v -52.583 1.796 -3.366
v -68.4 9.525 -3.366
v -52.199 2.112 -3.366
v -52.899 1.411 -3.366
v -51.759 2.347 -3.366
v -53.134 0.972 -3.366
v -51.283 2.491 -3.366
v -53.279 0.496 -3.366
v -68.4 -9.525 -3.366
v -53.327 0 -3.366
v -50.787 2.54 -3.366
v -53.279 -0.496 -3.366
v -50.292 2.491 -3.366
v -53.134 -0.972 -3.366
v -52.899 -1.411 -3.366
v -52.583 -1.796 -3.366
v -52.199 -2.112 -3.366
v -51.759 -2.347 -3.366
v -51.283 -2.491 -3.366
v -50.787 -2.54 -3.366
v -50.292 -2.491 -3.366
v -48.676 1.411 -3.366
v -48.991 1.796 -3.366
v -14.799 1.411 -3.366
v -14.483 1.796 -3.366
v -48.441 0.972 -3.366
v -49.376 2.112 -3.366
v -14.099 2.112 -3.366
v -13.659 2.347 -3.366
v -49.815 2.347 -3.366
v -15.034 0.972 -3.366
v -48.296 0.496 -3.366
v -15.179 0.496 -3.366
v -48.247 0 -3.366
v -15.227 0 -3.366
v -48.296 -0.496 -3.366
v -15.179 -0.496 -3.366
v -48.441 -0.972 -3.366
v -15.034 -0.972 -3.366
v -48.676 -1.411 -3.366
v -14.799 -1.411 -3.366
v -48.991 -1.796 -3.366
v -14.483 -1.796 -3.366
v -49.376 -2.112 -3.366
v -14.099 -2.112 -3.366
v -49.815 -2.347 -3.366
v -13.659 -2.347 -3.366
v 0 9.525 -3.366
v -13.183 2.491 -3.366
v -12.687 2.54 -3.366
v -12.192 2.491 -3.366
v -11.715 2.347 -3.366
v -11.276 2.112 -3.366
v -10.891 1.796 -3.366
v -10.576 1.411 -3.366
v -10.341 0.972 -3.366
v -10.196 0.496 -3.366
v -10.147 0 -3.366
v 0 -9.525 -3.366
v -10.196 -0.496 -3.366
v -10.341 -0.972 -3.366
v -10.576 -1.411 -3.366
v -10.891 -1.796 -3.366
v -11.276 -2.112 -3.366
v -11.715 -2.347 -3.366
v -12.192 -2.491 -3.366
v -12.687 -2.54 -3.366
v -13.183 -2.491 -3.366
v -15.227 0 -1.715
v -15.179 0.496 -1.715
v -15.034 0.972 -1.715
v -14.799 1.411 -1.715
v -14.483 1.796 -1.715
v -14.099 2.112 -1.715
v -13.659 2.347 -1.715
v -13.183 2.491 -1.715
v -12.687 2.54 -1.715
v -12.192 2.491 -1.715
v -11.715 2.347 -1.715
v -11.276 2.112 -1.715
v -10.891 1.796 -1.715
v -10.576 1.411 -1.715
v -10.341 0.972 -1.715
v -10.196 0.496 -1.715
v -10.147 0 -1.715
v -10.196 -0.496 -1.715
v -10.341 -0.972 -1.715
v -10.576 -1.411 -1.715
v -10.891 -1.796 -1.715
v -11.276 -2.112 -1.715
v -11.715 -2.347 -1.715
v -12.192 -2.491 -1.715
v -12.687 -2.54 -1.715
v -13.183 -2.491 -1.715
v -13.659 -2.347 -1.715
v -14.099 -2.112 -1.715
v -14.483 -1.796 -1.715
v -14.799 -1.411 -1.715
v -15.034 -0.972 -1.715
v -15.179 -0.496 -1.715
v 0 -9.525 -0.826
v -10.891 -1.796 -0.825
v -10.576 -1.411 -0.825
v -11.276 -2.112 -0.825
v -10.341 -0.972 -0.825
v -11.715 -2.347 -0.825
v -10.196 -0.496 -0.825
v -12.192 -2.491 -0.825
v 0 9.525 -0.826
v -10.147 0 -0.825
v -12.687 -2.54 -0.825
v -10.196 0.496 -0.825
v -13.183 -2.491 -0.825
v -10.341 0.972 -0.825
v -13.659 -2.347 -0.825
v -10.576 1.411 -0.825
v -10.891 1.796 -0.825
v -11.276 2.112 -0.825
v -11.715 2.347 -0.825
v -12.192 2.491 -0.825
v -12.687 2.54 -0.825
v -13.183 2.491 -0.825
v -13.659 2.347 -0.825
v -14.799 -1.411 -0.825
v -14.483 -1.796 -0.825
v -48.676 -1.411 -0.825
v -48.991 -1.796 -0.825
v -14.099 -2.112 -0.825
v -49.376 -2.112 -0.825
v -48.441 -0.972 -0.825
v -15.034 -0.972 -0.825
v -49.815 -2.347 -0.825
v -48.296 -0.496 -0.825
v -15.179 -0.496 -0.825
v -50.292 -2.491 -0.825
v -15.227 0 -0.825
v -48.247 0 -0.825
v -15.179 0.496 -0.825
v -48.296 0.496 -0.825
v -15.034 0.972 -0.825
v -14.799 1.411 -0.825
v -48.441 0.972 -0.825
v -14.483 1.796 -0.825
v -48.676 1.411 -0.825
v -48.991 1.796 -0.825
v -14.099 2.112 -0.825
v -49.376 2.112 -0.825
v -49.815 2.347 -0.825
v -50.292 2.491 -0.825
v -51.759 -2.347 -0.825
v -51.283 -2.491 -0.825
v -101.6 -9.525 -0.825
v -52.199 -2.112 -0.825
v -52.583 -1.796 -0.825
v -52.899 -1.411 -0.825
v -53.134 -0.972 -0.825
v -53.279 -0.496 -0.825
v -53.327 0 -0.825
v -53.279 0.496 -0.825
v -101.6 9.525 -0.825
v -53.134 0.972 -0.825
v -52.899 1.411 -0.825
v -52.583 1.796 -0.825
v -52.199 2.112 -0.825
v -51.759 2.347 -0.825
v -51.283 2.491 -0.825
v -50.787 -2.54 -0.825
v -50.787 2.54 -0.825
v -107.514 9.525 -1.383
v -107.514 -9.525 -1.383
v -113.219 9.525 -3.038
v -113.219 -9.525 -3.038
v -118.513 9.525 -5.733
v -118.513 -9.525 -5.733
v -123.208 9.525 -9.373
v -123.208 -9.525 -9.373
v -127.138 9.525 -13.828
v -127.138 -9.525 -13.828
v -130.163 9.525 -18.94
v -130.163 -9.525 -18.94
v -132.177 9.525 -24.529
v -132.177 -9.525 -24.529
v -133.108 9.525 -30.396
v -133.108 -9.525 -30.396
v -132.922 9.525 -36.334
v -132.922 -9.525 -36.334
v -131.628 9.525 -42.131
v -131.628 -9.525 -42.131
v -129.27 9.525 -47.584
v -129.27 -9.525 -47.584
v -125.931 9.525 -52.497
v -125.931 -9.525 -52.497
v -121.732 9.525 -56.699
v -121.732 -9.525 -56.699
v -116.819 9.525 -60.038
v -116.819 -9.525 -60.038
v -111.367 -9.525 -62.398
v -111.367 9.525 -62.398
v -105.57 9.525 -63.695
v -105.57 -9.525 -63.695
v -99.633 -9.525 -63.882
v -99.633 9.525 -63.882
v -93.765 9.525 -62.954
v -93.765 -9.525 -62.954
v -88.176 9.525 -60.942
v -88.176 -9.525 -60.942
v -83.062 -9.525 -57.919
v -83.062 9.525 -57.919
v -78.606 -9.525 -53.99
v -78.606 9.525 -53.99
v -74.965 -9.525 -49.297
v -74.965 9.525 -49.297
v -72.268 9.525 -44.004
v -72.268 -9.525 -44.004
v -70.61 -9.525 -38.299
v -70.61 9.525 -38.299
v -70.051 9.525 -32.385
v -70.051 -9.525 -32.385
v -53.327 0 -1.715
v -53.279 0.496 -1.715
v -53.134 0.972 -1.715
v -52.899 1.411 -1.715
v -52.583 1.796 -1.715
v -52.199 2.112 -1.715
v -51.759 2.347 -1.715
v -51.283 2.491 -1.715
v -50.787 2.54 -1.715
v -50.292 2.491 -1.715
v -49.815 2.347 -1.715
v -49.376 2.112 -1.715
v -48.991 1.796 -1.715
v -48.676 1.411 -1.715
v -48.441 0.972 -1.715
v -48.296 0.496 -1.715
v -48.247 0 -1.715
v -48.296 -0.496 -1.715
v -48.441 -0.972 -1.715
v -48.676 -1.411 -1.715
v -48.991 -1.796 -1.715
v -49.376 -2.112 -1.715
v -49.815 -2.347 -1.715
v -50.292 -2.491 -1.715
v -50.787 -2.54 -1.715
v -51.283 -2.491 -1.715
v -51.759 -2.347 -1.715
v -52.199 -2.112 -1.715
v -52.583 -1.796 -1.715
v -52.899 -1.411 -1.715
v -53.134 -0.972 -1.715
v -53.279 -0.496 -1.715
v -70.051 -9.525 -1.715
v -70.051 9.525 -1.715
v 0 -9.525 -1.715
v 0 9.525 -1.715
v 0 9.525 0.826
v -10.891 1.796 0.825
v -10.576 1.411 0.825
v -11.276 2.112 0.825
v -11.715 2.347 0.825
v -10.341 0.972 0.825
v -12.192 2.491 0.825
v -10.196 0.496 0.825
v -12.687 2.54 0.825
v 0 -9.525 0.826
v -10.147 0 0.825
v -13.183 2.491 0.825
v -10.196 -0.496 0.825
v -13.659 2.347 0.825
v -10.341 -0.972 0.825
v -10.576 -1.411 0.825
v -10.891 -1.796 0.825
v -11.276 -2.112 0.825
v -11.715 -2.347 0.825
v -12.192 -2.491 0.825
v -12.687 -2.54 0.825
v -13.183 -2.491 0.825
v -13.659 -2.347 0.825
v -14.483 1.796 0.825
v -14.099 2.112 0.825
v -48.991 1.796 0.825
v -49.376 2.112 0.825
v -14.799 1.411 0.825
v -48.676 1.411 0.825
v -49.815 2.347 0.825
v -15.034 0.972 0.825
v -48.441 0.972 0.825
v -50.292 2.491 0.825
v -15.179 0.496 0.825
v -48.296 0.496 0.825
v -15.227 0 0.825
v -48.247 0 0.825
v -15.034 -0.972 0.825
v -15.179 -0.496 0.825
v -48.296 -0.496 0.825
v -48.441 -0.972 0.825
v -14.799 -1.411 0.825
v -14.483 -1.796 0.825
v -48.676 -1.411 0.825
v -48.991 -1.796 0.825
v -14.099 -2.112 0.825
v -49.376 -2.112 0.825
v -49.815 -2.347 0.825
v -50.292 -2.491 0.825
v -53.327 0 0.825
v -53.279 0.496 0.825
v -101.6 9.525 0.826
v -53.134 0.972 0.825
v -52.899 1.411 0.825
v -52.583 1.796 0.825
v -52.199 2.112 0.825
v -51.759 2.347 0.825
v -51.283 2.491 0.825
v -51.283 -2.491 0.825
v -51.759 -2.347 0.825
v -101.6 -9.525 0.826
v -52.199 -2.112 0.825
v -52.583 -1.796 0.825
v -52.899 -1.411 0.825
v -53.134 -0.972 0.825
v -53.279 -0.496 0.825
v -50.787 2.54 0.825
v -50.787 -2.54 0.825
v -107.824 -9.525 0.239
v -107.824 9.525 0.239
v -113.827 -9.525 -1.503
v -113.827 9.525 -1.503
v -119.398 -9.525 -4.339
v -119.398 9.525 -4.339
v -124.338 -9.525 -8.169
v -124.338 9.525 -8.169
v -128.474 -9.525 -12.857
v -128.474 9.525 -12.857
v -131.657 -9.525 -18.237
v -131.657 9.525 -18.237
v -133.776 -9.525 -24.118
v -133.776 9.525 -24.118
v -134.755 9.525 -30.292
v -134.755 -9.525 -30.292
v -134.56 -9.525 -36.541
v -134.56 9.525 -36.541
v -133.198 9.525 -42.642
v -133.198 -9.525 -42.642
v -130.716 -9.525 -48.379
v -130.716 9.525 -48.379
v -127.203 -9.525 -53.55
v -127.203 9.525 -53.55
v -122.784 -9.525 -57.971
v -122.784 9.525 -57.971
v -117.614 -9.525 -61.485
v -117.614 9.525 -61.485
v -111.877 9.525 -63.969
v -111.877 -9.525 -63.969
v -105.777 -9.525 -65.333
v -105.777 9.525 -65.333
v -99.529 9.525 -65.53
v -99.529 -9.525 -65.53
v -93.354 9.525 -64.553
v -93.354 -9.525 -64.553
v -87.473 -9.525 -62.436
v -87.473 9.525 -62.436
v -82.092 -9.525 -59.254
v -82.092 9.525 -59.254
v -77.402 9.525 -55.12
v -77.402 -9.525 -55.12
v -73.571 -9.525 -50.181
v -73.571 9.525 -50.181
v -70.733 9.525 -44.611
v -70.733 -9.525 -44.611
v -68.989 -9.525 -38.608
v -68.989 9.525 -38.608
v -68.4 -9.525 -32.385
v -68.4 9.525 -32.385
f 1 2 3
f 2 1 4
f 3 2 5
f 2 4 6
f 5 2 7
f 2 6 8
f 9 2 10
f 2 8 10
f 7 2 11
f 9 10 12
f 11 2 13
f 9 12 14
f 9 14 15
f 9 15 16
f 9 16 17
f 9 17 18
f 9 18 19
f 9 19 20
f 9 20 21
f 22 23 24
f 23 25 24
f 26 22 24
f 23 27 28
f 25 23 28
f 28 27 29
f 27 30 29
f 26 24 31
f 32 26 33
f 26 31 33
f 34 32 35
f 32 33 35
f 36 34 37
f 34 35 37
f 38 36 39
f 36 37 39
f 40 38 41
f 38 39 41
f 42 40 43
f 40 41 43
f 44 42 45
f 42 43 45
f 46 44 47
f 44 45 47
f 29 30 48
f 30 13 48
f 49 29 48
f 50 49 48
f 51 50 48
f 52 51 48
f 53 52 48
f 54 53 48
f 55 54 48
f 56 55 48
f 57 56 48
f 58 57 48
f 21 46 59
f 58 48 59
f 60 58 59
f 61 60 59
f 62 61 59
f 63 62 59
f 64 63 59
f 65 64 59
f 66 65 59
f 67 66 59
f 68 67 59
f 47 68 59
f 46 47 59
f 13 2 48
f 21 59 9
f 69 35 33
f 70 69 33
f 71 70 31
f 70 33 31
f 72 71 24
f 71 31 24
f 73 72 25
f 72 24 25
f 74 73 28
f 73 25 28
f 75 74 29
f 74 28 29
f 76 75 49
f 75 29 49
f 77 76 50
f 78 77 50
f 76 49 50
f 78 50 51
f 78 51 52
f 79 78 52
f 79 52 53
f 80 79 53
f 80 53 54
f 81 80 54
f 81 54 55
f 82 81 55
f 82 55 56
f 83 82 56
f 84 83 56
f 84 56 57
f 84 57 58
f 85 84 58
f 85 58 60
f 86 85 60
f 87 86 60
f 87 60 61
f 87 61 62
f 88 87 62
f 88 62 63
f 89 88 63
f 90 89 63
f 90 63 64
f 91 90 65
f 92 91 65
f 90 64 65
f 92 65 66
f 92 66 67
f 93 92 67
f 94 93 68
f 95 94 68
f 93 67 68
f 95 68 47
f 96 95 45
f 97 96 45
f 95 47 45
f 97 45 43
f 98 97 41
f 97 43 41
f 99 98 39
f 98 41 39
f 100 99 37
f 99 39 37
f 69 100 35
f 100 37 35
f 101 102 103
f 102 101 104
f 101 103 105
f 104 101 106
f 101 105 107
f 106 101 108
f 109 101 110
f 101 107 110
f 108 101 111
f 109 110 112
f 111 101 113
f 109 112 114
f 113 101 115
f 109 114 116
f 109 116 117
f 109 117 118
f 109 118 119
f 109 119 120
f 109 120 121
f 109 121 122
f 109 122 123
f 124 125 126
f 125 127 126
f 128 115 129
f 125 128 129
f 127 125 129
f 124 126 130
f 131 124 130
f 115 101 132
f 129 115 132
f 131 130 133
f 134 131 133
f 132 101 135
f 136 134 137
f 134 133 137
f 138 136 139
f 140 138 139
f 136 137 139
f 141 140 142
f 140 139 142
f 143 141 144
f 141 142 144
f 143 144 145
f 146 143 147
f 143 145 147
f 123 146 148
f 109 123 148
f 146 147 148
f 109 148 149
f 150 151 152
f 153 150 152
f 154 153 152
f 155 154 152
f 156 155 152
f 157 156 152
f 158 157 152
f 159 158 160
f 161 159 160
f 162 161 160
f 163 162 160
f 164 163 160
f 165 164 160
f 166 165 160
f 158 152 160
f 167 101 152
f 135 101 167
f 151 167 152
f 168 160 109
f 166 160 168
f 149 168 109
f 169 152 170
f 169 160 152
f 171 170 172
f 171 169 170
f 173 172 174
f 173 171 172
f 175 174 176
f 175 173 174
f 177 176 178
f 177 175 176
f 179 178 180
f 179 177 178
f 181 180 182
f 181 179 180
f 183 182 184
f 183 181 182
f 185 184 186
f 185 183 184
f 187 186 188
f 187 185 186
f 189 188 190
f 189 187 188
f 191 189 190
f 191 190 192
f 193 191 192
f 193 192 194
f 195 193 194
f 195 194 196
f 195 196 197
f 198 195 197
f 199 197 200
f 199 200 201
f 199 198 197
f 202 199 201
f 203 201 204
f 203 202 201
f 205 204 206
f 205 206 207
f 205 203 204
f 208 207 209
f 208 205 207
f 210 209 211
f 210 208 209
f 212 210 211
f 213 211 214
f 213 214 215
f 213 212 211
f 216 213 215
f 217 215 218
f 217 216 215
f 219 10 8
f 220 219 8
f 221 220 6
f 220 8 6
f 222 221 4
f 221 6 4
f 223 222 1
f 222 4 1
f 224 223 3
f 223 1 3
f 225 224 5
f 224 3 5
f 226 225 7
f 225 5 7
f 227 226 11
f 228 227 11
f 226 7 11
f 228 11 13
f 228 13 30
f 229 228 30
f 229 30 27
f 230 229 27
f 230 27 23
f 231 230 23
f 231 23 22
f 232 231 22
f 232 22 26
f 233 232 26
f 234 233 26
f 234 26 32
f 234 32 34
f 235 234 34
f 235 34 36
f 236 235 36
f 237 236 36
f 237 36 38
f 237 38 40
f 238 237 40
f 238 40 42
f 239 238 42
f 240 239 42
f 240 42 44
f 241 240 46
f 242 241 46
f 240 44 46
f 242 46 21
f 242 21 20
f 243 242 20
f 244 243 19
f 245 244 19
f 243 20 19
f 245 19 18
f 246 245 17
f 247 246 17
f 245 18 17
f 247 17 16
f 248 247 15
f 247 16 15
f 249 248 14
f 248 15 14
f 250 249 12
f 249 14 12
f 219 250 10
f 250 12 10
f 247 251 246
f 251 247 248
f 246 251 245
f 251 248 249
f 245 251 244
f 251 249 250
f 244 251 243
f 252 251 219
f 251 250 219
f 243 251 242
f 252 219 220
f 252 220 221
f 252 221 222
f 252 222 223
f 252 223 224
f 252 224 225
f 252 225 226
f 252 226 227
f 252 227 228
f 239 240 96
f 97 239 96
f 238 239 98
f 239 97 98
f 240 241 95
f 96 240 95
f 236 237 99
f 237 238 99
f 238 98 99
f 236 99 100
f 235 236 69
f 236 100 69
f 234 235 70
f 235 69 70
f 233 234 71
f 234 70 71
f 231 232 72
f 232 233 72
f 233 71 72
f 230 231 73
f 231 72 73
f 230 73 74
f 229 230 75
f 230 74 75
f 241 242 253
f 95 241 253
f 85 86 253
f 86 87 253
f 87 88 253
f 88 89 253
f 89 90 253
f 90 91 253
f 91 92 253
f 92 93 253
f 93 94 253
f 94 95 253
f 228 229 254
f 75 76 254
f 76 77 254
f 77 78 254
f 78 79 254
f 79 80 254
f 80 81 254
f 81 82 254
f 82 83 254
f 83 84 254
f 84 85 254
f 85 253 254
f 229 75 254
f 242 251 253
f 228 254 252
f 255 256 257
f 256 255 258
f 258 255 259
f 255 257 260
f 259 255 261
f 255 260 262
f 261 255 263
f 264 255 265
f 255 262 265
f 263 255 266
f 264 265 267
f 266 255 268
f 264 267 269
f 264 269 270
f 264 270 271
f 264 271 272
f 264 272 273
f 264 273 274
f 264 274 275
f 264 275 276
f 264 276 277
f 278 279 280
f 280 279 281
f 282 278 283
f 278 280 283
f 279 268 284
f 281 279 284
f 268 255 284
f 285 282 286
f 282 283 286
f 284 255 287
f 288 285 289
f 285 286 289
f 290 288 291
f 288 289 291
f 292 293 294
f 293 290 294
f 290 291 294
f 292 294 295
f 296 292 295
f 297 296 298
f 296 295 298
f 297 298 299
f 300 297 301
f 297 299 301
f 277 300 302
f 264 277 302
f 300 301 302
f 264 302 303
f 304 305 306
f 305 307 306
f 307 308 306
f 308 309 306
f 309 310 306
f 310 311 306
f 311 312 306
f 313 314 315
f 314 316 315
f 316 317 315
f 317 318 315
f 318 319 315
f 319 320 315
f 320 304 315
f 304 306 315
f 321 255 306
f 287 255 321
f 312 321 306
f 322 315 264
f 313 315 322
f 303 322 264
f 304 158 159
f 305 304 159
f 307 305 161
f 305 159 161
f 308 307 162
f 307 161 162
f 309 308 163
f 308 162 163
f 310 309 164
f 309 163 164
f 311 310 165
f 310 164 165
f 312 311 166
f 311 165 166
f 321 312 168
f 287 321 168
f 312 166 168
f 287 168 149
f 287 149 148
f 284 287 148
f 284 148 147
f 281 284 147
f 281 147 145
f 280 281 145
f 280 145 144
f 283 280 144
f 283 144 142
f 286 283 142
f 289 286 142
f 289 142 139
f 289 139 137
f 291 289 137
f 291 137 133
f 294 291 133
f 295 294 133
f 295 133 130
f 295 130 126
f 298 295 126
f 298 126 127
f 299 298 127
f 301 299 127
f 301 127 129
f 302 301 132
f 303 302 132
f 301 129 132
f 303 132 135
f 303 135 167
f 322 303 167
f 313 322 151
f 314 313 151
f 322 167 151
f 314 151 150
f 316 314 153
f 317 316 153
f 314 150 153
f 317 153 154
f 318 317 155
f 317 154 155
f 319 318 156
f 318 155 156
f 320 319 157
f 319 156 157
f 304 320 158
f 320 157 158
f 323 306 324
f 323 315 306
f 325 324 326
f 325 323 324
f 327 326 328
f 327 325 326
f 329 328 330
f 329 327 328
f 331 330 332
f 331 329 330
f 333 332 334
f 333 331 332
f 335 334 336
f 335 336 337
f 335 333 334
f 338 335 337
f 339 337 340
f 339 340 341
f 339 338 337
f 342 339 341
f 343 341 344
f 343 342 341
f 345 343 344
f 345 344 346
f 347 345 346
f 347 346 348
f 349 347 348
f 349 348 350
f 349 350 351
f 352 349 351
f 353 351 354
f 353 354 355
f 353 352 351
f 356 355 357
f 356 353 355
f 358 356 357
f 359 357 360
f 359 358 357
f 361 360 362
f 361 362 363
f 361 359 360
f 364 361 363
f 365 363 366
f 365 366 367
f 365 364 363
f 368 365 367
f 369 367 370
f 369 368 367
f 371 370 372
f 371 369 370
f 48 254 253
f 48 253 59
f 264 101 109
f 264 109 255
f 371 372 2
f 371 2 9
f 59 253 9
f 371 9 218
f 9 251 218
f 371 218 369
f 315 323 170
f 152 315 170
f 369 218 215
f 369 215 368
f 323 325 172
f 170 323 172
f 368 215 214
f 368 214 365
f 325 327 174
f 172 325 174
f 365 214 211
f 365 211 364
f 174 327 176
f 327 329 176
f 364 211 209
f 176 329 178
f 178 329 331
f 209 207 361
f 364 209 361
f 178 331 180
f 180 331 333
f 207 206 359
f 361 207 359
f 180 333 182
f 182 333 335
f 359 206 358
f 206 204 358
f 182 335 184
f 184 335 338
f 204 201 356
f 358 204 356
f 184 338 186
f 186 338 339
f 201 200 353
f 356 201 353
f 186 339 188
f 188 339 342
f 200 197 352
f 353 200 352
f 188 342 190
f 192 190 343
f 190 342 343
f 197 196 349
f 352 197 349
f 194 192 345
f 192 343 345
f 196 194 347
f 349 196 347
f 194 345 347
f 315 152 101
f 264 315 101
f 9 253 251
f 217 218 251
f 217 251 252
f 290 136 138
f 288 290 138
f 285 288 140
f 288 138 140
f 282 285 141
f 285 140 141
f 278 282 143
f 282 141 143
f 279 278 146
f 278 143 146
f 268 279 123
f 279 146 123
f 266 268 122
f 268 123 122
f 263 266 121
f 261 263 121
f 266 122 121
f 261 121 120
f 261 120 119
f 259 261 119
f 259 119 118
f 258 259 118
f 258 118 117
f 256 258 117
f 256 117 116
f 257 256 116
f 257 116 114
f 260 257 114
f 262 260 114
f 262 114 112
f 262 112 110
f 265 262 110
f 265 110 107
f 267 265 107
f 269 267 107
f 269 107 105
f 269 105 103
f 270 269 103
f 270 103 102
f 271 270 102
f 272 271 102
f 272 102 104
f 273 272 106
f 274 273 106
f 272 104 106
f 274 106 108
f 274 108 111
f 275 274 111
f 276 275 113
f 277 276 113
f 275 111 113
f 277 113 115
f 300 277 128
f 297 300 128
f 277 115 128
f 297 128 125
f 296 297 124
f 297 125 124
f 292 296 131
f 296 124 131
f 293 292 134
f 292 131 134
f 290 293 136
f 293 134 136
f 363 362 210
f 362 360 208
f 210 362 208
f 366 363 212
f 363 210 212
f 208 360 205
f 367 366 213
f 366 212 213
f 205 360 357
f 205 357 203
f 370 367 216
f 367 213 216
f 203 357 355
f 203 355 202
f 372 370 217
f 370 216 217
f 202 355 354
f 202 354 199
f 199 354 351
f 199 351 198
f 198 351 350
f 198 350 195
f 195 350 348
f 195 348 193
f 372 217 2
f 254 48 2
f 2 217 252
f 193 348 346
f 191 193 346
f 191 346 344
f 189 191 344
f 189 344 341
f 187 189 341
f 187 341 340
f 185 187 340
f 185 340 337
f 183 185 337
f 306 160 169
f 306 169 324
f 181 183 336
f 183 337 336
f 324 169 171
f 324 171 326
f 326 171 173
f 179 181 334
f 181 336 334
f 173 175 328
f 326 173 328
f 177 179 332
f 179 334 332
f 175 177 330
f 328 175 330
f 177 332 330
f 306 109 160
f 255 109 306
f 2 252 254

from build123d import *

# Parameters (mm, degrees)
SKETCH2_W          = 1.651
SKETCH2_H          = 19.05
SKETCH3_R          = 2.54
CUT_EXTRUDE1_DEPTH = 5.191001743


with BuildPart() as part:
    # Sweep1: sweep along a path in Sketch1
    with BuildLine(Plane(origin=(0, 0, 0), x_dir=(1, 0, 0), z_dir=(0, 1, 0))) as sweep1_path:
        Line((0, 0), (-101.6, 0))
        ThreePointArc((-101.6, 0), (-124.514215323, 55.280847216), (-69.225758741, 32.384998213))
        Line((-69.225758741, 32.384998213), (-69.225758741, 2.54))
        Line((-69.225758741, 2.54), (0, 2.54))
    # Sketch2 → Sweep1 (sweep)
    with BuildSketch(Plane(origin=(0, 0, 0), x_dir=(0, 0, -1), z_dir=(1, 0, 0))):
        Rectangle(SKETCH2_W, SKETCH2_H)
    sweep(path=sweep1_path.line, transition=Transition.RIGHT)

    # Sketch3 → Cut-Extrude1 (cut, through all)
    with BuildSketch(Plane(origin=(0, 0, -3.3655), x_dir=(-1, 0, 0), z_dir=(0, 0, -1))):
        with Locations((50.787439211, 0)):
            Circle(SKETCH3_R)
        with Locations((12.687439211, 0)):
            Circle(SKETCH3_R)
    extrude(amount=-CUT_EXTRUDE1_DEPTH, mode=Mode.SUBTRACT)


solid = part.part
